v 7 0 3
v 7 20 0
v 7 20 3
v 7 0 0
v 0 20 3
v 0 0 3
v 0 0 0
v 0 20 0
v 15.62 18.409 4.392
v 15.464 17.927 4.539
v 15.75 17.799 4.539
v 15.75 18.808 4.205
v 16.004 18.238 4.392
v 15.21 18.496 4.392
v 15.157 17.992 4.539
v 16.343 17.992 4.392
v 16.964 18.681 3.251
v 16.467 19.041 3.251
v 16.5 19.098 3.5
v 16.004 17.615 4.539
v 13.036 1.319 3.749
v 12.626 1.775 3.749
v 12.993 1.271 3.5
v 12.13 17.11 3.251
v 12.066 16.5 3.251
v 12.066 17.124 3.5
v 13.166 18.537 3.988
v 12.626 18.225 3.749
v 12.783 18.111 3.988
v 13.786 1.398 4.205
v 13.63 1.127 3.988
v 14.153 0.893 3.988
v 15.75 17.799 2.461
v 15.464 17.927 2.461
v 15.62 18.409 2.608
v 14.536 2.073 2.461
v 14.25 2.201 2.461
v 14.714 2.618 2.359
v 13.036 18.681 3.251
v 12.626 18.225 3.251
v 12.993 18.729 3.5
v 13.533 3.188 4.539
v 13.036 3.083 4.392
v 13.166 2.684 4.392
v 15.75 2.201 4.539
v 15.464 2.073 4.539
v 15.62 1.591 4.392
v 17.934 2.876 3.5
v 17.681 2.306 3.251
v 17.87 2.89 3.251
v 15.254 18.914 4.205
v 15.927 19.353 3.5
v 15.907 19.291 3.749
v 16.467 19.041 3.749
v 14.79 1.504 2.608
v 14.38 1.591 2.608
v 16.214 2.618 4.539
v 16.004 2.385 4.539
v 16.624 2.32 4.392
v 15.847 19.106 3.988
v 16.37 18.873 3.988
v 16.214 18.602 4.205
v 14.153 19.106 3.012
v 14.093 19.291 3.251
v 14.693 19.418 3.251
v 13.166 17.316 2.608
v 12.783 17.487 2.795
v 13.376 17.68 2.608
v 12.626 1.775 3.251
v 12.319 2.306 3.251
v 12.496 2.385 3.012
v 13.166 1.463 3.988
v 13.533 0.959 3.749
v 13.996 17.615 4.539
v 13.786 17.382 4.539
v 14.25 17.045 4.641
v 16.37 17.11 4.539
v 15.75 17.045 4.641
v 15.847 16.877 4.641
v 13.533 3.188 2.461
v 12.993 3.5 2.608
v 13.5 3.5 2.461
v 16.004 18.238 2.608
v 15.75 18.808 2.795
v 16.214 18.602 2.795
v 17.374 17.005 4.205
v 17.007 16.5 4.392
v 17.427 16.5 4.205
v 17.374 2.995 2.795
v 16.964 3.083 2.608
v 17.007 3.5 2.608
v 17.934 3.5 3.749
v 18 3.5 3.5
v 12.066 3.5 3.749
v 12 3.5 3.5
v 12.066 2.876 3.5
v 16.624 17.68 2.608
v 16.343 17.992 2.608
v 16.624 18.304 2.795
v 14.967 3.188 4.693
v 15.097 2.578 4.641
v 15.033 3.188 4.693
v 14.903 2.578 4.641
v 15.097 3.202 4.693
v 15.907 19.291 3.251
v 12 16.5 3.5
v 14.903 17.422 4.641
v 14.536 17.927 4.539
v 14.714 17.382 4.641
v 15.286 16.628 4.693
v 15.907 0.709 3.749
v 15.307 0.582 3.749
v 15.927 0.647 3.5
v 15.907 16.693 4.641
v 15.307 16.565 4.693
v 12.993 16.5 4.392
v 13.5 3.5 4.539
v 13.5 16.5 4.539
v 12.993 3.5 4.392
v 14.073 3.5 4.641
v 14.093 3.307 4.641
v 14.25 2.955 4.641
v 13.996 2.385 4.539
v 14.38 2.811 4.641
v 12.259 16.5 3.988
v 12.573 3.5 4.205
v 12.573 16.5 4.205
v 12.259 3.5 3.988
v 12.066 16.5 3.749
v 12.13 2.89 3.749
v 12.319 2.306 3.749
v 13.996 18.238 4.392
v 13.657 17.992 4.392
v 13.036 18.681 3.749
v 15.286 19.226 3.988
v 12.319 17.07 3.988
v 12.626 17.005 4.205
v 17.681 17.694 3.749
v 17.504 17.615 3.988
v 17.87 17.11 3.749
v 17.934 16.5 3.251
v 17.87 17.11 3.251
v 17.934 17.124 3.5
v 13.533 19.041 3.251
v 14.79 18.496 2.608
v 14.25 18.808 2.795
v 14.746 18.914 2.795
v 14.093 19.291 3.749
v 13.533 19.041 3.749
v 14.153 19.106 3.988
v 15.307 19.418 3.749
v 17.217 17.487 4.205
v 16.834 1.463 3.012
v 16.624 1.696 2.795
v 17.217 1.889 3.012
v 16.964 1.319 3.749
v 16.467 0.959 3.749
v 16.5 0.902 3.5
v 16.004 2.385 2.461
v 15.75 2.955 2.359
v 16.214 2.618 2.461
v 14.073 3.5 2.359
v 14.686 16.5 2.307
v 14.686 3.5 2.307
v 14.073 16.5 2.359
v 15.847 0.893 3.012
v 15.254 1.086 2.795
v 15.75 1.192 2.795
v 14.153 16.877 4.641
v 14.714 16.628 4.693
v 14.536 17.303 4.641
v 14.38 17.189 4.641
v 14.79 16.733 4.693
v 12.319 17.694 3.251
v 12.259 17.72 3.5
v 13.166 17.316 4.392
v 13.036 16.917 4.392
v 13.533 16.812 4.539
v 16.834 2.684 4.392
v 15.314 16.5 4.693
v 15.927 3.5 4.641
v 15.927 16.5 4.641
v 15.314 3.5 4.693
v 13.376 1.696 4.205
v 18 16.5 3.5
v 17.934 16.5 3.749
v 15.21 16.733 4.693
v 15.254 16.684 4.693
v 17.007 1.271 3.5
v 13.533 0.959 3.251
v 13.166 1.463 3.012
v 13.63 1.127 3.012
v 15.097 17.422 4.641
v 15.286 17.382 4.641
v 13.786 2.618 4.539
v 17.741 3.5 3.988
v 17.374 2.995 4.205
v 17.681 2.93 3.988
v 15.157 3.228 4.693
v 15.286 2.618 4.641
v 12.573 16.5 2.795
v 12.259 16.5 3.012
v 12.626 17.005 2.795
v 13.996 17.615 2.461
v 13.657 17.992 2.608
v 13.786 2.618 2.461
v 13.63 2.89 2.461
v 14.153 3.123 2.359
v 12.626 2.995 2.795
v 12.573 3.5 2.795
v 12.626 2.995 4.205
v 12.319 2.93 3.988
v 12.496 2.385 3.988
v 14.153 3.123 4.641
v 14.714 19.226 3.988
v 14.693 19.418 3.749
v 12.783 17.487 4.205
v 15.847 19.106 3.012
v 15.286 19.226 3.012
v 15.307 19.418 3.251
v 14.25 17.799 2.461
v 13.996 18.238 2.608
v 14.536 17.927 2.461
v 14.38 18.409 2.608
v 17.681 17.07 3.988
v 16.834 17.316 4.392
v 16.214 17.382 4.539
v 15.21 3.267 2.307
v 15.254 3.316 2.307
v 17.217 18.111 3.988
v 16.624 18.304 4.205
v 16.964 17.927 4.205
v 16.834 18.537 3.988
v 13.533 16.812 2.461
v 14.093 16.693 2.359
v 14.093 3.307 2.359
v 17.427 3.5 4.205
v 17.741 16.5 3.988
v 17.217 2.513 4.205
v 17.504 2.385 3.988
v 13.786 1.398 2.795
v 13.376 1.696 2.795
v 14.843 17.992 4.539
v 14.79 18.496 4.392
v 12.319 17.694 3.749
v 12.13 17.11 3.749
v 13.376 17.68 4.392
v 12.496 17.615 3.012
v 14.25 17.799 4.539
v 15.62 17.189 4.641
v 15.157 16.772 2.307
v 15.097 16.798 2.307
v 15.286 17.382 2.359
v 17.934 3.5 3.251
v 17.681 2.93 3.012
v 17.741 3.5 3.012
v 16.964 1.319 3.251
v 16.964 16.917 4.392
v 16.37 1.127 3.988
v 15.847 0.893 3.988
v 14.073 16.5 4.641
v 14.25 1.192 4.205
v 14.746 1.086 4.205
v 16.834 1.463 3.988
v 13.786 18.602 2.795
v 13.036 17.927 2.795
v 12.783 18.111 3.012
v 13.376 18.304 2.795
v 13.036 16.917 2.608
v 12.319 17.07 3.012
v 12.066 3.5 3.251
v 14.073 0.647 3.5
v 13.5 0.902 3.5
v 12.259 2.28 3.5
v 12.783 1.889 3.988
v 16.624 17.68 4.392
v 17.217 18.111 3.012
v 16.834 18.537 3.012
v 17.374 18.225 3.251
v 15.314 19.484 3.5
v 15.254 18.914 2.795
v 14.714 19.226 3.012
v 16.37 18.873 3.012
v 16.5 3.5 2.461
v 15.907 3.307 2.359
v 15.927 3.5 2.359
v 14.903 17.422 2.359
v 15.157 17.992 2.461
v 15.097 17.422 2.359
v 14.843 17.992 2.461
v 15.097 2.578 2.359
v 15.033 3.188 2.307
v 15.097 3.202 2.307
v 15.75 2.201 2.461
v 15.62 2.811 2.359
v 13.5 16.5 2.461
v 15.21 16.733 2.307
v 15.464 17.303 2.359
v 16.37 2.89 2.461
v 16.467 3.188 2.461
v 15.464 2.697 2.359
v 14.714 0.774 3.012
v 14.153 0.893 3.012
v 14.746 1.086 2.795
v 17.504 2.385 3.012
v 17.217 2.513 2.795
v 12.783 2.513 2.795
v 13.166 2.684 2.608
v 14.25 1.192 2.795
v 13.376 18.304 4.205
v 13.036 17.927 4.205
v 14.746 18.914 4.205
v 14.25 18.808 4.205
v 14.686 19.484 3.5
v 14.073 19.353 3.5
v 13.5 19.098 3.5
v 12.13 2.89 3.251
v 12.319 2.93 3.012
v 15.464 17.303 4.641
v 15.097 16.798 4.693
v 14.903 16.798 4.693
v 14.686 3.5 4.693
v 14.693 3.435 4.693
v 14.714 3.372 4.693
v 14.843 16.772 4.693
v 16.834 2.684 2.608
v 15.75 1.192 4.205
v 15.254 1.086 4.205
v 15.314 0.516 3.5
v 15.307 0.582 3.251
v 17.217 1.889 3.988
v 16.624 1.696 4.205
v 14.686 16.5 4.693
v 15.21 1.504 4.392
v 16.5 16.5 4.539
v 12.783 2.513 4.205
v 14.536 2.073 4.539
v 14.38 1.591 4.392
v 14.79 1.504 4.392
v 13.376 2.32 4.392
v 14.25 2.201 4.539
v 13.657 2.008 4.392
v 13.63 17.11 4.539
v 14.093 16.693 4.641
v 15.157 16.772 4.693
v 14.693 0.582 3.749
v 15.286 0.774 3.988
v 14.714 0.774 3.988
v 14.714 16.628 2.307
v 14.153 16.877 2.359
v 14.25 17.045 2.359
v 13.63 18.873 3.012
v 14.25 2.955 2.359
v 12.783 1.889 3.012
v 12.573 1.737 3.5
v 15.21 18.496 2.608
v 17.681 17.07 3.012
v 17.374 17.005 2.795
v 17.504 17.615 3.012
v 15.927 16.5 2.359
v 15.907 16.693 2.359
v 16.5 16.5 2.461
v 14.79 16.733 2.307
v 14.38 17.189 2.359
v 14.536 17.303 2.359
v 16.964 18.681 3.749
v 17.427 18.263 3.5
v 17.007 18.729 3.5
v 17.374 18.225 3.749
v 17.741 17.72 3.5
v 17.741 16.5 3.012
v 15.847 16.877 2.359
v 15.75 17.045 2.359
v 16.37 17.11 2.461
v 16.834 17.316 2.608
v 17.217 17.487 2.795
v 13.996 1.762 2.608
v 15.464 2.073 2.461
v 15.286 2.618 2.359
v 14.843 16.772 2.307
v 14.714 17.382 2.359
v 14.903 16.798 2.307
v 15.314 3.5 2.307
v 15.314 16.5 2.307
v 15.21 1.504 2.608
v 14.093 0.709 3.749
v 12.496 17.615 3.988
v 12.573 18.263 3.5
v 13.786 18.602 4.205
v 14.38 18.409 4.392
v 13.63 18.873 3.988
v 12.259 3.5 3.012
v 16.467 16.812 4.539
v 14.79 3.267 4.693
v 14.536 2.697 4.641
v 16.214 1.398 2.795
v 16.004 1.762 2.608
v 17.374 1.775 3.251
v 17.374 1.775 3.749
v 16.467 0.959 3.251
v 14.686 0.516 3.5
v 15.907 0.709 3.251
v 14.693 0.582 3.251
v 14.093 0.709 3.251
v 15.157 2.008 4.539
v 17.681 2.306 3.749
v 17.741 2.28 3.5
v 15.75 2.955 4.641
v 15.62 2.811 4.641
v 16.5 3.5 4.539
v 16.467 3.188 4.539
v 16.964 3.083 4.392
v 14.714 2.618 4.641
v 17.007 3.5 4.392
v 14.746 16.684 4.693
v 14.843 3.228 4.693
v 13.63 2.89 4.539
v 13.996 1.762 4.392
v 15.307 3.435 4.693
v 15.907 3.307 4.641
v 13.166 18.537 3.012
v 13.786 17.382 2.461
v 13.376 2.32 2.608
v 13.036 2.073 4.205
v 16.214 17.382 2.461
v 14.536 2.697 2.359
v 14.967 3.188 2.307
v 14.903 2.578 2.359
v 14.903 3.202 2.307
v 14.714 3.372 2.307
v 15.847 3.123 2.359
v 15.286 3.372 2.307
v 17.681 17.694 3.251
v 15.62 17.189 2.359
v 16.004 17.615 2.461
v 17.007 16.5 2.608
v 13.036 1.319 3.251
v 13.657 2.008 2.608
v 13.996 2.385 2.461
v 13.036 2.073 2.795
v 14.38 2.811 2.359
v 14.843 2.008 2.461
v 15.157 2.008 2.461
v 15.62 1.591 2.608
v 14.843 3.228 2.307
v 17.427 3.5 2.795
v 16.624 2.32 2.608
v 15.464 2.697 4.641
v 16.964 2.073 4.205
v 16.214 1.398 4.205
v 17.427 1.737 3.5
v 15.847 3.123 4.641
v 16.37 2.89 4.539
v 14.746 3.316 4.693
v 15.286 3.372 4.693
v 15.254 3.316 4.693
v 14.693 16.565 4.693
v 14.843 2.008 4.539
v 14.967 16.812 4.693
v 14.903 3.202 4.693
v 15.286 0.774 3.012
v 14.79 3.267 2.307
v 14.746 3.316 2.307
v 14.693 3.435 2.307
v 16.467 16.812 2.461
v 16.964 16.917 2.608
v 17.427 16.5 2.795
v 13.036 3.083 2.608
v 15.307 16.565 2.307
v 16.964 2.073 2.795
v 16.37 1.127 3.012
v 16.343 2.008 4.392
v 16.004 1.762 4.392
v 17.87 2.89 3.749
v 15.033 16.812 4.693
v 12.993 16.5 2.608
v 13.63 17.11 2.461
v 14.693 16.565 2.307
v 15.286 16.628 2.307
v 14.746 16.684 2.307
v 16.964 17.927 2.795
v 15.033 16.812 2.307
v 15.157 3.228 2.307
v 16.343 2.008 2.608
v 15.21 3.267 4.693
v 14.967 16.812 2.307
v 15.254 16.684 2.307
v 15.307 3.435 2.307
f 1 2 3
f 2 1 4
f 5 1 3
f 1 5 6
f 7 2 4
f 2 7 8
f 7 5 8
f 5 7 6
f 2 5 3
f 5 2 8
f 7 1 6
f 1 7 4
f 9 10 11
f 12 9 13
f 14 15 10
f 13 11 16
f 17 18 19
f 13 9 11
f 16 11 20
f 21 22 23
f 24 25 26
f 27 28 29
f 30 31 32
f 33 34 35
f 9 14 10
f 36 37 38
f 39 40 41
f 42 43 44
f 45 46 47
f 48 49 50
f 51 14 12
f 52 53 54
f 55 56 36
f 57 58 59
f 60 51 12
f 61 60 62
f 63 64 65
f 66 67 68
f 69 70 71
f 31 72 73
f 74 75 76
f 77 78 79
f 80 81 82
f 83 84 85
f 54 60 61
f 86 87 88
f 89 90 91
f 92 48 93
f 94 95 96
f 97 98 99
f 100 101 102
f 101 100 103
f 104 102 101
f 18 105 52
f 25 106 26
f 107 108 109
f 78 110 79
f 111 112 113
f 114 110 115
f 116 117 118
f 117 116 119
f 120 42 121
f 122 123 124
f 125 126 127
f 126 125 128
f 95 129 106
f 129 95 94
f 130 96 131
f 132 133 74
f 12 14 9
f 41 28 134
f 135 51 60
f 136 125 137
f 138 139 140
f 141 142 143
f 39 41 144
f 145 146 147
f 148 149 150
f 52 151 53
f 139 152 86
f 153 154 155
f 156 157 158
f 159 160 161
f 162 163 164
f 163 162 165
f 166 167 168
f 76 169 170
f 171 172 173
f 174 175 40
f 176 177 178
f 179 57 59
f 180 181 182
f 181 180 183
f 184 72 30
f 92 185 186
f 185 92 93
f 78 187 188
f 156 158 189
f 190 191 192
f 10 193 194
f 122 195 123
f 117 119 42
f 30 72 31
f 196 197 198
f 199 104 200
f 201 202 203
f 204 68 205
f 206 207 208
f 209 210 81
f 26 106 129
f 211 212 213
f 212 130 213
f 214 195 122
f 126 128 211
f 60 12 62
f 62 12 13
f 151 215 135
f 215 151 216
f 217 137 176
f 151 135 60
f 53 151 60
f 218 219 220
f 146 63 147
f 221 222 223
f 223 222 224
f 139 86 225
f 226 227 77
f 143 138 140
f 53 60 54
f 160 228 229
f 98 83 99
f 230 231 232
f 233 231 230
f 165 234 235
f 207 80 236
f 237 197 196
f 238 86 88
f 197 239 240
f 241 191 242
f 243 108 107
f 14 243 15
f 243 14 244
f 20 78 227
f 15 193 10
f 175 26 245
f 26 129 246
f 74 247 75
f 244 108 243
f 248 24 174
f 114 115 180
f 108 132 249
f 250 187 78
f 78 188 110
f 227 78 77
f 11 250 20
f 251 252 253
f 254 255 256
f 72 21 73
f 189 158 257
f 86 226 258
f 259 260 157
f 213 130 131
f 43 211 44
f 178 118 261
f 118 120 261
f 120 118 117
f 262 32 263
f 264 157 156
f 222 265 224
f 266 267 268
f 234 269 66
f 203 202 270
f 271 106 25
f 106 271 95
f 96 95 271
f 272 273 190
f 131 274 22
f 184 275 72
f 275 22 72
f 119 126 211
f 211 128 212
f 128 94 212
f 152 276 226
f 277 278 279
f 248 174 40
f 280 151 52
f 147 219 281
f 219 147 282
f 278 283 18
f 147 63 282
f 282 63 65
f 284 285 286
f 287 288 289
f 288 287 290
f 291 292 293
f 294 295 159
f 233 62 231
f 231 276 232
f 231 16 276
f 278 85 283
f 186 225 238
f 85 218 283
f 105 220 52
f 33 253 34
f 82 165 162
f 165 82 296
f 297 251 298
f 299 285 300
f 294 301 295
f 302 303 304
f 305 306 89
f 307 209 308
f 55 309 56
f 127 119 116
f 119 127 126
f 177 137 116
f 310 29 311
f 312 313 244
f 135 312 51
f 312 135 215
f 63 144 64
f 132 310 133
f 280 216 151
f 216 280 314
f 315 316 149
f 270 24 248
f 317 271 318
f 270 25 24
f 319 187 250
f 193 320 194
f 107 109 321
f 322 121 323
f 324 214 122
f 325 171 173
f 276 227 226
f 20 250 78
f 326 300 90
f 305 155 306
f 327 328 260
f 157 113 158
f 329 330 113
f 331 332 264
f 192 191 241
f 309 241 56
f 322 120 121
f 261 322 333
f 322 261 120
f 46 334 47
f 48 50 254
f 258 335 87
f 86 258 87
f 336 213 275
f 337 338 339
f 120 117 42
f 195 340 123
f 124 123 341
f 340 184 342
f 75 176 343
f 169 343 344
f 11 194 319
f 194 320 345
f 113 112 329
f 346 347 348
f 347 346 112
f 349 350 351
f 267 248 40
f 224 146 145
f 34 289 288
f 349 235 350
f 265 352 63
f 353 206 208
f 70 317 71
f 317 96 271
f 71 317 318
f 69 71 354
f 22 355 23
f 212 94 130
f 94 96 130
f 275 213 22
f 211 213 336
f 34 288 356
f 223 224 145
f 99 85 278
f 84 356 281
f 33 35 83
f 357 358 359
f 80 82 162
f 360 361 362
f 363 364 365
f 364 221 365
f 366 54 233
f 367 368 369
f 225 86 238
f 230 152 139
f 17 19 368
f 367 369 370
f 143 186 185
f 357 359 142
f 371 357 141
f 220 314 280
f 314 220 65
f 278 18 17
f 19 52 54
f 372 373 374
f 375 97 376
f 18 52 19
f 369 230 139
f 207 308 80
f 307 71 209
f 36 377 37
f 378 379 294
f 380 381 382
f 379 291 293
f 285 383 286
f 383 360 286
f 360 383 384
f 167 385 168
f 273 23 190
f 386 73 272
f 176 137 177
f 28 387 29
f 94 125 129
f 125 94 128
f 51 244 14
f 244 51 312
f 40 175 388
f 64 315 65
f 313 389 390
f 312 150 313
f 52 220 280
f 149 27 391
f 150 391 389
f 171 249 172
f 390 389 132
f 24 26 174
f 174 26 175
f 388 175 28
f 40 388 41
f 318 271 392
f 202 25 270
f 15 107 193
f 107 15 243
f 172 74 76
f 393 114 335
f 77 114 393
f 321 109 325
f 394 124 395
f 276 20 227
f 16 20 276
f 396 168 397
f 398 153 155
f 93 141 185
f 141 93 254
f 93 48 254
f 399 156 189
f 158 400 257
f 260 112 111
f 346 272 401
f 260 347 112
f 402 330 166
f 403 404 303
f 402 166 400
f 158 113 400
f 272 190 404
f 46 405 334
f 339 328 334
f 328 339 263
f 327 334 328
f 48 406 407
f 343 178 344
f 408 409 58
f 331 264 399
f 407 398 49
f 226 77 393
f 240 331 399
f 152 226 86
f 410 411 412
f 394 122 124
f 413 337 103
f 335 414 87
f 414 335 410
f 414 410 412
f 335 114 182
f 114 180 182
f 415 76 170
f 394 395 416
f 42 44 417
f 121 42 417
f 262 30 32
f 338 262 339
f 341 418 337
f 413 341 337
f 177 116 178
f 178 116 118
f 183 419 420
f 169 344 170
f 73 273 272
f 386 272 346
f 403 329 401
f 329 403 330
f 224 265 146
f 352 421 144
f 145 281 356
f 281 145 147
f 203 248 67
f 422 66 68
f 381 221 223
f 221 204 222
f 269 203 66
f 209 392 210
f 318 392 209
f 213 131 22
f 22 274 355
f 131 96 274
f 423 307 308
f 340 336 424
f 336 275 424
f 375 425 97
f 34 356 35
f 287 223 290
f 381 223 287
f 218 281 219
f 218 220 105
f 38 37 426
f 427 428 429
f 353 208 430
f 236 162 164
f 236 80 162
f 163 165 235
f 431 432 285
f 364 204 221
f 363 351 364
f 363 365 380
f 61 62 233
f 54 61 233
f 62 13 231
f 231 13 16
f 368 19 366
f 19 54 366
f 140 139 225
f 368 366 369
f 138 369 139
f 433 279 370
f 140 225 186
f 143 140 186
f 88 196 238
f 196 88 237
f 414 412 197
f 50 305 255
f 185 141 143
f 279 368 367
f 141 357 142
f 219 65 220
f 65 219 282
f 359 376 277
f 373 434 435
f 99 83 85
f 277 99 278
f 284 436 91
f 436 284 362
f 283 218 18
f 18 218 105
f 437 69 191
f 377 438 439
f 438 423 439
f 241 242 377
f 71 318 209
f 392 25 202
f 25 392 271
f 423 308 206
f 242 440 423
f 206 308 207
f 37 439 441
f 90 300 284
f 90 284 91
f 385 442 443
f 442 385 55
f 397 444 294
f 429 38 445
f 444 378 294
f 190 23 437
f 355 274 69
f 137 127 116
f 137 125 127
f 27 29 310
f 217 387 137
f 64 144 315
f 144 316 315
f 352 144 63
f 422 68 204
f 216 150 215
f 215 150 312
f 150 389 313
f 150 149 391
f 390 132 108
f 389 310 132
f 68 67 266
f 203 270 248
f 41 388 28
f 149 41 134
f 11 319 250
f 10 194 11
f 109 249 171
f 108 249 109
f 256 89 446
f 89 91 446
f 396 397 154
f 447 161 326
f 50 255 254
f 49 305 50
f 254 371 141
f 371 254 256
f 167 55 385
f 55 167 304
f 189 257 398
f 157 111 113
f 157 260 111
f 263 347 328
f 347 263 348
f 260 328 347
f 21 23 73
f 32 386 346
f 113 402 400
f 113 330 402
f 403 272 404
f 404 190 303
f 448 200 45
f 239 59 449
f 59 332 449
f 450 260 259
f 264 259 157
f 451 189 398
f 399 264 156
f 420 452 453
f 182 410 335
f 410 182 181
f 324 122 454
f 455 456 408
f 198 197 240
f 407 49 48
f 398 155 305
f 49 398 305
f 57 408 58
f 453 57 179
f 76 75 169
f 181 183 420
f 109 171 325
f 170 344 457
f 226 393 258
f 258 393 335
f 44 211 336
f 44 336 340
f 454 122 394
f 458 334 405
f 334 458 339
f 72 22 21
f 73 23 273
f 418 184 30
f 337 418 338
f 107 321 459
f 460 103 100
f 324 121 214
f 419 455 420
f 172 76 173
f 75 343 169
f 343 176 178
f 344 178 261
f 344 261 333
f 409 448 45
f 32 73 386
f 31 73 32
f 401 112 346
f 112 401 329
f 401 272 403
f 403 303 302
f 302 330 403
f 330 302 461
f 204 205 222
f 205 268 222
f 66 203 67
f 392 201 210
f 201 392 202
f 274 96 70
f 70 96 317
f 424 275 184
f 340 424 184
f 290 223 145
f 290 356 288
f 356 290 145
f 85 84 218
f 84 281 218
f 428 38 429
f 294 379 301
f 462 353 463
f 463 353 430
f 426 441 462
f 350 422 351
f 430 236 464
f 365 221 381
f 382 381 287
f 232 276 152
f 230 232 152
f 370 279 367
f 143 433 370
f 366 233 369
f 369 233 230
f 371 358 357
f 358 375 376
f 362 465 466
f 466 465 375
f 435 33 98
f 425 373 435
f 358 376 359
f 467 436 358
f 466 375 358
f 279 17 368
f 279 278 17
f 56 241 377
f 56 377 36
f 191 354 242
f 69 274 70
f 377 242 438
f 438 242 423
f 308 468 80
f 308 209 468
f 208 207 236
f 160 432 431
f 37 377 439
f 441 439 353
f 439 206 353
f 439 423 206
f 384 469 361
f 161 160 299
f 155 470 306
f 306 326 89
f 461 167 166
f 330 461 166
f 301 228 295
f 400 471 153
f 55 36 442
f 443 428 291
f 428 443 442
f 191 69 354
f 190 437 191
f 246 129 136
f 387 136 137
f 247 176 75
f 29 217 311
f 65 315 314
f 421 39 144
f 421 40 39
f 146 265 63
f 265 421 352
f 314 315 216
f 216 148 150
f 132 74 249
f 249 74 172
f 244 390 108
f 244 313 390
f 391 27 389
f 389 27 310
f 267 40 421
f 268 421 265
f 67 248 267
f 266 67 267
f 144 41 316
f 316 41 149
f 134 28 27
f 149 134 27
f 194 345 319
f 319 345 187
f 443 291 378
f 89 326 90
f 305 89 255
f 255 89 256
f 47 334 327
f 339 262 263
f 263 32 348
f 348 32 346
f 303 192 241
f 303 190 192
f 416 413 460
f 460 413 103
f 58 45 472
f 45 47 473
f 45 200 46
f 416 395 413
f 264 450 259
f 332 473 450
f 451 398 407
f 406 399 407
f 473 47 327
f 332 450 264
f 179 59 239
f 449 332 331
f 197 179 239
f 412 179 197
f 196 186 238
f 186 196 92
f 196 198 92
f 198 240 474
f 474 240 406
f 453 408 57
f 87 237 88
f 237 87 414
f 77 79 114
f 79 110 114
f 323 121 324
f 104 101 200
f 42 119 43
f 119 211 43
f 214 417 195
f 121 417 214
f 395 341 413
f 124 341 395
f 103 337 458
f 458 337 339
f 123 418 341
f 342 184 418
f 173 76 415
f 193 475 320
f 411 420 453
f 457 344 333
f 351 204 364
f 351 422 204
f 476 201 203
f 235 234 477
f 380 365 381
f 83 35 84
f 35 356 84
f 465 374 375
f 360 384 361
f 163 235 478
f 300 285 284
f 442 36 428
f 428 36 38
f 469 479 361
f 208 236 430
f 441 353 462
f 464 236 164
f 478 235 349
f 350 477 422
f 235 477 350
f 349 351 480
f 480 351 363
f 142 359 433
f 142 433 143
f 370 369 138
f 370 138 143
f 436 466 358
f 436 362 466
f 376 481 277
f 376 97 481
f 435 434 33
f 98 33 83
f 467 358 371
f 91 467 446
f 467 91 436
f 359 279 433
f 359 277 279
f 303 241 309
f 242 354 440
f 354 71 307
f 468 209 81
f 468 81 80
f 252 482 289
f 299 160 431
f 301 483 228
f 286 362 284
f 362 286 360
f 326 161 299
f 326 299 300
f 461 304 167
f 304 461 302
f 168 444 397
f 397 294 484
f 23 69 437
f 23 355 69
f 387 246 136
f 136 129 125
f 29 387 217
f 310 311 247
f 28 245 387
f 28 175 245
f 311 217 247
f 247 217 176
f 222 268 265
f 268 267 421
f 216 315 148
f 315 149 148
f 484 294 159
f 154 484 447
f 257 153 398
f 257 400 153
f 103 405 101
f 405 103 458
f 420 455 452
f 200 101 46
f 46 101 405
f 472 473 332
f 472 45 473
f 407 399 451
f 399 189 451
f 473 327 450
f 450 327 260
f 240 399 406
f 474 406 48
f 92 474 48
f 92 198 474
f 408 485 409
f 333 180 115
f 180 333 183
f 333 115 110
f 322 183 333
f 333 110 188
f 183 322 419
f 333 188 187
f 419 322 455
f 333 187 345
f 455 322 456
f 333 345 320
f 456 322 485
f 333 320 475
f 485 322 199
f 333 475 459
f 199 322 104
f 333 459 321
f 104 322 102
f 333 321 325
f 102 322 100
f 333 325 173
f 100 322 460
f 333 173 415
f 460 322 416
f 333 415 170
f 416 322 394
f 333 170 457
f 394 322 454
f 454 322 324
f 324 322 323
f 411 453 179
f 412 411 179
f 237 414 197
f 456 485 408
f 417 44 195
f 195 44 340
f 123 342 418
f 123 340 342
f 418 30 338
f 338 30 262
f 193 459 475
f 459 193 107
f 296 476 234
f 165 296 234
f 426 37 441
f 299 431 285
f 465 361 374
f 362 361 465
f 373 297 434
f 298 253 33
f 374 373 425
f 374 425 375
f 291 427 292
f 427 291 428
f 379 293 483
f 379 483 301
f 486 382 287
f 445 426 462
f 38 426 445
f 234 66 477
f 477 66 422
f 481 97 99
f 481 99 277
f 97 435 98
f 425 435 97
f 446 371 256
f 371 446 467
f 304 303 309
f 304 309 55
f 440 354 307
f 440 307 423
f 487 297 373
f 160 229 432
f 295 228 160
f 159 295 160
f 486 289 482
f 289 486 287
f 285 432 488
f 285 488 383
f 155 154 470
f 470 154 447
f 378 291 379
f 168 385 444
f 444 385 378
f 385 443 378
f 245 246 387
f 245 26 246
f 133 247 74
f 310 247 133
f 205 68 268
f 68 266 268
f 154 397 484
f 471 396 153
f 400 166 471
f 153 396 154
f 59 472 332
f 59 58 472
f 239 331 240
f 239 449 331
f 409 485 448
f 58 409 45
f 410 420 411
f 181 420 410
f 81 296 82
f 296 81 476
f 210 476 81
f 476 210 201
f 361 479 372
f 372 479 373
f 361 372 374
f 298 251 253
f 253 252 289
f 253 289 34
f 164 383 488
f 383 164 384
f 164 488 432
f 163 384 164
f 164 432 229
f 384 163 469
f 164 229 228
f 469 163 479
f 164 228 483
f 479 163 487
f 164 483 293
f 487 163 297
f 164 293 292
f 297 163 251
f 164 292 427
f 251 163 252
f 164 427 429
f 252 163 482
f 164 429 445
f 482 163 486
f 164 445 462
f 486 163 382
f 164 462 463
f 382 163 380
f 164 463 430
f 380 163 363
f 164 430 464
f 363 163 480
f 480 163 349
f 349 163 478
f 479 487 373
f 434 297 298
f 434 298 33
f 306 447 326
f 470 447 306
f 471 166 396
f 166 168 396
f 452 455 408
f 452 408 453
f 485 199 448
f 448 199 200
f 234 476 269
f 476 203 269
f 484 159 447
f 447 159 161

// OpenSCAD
w=7;
l=20;
h=3;


flat_factor=.4;

$fn=30;

cube([w,l,h]);
hull()
{
translate([15,w/2,w/2])
scale([1,1,flat_factor]) sphere(r=h);
translate([15,l-w/2,w/2])
scale([1,1,flat_factor]) sphere(r=h);
}
